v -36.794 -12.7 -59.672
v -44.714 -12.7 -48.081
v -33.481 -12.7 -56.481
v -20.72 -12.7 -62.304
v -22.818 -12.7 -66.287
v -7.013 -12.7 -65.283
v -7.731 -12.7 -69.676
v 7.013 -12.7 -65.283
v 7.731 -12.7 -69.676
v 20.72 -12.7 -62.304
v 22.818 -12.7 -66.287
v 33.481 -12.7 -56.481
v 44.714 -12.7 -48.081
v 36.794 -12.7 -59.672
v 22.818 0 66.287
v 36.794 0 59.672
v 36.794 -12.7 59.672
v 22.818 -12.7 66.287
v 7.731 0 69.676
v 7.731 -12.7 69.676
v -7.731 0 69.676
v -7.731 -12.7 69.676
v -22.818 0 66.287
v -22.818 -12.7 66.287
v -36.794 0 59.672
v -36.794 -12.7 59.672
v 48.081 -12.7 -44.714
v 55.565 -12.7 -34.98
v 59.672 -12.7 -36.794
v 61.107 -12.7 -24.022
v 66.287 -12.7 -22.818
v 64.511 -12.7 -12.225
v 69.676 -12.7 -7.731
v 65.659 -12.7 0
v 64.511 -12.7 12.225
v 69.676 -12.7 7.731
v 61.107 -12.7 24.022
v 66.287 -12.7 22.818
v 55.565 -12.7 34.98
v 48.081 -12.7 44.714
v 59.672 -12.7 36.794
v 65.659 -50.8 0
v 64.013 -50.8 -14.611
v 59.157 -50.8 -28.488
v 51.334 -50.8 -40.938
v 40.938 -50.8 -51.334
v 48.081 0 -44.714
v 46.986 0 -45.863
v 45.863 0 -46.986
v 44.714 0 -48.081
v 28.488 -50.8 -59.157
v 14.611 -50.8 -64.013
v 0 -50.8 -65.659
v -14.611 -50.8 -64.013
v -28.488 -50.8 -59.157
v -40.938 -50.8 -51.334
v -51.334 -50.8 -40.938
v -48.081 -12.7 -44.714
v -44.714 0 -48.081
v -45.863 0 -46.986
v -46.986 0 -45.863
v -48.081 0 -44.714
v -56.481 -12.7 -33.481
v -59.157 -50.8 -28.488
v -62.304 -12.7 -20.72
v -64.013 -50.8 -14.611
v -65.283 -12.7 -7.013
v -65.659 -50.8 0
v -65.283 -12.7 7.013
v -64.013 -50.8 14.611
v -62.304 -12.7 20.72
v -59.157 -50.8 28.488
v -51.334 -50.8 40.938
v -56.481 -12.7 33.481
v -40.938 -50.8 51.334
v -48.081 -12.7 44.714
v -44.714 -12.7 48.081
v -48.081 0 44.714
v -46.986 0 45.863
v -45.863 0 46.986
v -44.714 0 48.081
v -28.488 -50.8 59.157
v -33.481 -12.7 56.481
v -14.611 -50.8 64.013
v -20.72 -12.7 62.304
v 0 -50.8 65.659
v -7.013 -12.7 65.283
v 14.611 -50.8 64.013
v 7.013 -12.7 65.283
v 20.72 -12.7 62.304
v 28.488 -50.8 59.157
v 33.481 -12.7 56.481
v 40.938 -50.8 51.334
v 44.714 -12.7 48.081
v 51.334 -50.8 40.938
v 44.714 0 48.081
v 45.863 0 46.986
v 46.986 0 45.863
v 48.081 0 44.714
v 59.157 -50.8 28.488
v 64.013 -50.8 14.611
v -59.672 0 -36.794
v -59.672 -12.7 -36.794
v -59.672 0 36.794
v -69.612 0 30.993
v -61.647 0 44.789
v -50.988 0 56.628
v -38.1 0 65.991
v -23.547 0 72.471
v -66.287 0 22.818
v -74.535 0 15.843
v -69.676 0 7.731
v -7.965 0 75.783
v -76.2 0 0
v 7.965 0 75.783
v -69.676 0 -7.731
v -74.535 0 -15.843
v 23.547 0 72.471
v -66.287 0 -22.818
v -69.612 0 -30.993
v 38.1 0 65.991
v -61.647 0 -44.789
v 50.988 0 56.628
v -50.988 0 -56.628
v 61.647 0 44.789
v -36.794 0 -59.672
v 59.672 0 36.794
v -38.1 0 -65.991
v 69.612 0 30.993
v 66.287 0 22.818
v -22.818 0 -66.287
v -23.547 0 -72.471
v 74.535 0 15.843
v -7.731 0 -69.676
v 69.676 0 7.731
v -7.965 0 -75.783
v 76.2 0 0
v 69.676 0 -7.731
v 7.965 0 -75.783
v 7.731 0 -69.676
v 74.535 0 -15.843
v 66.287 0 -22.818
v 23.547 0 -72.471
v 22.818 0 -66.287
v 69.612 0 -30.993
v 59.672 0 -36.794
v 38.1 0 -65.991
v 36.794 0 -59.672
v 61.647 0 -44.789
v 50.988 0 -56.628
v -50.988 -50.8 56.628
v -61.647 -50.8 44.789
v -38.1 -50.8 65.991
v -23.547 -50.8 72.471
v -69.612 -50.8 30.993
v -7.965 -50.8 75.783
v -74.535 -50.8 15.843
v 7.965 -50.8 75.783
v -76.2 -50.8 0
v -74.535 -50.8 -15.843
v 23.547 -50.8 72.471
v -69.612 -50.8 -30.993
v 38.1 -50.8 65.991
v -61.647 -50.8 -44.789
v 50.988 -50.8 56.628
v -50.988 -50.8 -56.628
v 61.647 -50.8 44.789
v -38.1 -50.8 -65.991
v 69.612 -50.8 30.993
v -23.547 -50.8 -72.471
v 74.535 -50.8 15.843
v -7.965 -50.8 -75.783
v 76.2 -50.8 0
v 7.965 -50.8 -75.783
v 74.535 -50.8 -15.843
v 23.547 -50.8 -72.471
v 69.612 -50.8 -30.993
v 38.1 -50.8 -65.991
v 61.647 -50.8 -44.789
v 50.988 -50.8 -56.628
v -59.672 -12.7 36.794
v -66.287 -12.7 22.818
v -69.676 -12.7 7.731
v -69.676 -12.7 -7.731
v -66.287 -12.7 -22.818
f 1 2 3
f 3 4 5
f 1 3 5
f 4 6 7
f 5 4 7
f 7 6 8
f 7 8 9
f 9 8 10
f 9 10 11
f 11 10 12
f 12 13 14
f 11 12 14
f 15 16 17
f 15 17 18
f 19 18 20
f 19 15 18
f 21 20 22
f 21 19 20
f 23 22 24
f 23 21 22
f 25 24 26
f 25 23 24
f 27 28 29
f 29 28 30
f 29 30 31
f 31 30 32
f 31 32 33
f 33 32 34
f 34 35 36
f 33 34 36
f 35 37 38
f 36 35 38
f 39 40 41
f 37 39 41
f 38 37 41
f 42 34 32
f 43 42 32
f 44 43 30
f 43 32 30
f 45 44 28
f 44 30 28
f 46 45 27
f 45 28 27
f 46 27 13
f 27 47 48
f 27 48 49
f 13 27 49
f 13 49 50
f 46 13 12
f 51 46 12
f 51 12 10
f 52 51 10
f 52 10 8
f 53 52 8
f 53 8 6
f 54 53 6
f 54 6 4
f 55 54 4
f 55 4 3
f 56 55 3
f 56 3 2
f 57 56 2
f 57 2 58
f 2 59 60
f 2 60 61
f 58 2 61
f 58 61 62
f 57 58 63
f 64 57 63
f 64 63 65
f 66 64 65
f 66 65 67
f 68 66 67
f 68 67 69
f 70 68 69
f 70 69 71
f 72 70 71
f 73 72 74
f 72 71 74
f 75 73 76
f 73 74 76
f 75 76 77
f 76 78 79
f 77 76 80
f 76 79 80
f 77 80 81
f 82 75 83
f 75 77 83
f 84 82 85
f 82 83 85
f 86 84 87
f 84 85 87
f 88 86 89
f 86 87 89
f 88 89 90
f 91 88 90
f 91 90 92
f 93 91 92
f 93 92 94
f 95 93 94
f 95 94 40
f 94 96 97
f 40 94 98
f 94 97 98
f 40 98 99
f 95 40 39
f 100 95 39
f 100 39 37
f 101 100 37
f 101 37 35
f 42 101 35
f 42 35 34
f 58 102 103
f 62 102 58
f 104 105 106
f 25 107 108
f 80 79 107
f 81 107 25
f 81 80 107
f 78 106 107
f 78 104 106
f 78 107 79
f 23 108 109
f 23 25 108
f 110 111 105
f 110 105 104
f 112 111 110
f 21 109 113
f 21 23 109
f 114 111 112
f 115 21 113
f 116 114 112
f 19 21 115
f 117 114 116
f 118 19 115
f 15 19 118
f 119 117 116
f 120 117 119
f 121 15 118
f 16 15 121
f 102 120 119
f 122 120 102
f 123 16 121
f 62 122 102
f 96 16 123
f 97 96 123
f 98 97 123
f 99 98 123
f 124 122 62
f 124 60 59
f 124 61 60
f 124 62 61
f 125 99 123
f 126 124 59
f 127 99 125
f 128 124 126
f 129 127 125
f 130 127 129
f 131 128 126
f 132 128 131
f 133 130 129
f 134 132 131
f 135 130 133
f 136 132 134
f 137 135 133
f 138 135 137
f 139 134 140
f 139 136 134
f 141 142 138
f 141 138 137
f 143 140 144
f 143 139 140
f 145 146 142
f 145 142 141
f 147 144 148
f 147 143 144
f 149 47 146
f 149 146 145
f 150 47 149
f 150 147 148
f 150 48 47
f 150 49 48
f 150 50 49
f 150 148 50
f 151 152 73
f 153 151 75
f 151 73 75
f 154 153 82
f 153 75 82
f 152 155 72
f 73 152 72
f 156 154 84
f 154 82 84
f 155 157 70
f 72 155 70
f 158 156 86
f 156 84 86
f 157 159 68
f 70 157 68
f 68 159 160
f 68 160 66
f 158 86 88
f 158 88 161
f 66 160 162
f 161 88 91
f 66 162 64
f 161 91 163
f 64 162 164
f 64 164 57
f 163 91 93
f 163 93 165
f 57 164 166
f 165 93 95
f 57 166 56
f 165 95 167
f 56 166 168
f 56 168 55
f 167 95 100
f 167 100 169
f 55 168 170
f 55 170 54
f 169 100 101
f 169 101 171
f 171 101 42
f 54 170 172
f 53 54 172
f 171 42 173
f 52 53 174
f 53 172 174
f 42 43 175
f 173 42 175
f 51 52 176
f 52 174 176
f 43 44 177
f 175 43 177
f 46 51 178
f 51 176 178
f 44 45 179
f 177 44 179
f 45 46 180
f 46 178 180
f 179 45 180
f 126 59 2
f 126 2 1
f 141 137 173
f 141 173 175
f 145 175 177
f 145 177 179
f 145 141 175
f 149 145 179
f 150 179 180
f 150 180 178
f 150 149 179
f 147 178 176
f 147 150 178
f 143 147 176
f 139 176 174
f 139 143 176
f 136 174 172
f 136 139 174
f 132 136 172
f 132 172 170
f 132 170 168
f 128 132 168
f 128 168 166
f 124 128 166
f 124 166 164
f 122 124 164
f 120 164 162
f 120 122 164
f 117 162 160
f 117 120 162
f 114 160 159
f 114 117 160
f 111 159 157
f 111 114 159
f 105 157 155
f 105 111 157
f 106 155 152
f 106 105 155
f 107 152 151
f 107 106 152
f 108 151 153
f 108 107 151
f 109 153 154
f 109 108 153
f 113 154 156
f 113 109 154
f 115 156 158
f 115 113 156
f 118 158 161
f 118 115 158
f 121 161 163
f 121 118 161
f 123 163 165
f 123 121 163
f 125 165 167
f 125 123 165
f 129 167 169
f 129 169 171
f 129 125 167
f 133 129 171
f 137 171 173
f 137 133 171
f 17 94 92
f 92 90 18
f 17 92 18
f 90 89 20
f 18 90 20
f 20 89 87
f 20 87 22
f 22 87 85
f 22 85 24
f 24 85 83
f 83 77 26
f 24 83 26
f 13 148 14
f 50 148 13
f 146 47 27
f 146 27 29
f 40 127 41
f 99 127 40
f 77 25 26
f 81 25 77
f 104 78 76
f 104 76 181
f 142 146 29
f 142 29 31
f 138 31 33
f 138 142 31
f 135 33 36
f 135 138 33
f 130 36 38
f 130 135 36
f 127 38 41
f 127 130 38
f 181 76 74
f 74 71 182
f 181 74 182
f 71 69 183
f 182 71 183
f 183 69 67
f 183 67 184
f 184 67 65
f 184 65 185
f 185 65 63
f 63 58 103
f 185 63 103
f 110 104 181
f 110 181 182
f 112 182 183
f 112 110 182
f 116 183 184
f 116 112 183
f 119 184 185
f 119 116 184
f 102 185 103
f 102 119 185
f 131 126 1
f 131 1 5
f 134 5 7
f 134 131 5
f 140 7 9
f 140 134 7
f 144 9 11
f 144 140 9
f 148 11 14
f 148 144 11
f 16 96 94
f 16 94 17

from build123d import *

# Parameters (mm, degrees)
SKETCH1_R           = 76.2
SKETCH1_R_2         = 65.659
BOSS_EXTRUDE1_DEPTH = 50.8
CUT_EXTRUDE1_DEPTH  = 12.7
CIRPATTERN1_COUNT   = 4


with BuildPart() as part:
    # Sketch1 → Boss-Extrude1 (new body)
    with BuildSketch(Plane(origin=(0, 0, 0), x_dir=(1, 0, 0), z_dir=(0, 1, 0))):
        Circle(SKETCH1_R)
        Circle(SKETCH1_R_2, mode=Mode.SUBTRACT)
    extrude(amount=-BOSS_EXTRUDE1_DEPTH)

    # Sketch2 → Cut-Extrude1 (cut)
    with BuildSketch(Plane(origin=(0, 0, 0), x_dir=(1, 0, 0), z_dir=(0, 1, 0))):
        with BuildLine():
            Line((-48.080896893, -44.713886377), (-59.672253185, -36.793926344))
            ThreePointArc((-59.672253185, -36.793926344), (-70.104, 0), (-59.672253185, 36.793926344))
            Line((-59.672253185, 36.793926344), (-48.080896893, 44.713886377))
            ThreePointArc((-48.080896893, 44.713886377), (-65.659, 0), (-48.080896893, -44.713886377))
        make_face()
    cut_extrude1 = extrude(amount=-CUT_EXTRUDE1_DEPTH, mode=Mode.SUBTRACT)

    # CirPattern1: Cut-Extrude1 ×4 about axis
    cirpattern1_axis = Axis((0, 0, 0), (0, 1, 0))
    for i in range(1, CIRPATTERN1_COUNT):
        add(cut_extrude1.rotate(cirpattern1_axis, i * 360 / CIRPATTERN1_COUNT), mode=Mode.SUBTRACT)


solid = part.part
